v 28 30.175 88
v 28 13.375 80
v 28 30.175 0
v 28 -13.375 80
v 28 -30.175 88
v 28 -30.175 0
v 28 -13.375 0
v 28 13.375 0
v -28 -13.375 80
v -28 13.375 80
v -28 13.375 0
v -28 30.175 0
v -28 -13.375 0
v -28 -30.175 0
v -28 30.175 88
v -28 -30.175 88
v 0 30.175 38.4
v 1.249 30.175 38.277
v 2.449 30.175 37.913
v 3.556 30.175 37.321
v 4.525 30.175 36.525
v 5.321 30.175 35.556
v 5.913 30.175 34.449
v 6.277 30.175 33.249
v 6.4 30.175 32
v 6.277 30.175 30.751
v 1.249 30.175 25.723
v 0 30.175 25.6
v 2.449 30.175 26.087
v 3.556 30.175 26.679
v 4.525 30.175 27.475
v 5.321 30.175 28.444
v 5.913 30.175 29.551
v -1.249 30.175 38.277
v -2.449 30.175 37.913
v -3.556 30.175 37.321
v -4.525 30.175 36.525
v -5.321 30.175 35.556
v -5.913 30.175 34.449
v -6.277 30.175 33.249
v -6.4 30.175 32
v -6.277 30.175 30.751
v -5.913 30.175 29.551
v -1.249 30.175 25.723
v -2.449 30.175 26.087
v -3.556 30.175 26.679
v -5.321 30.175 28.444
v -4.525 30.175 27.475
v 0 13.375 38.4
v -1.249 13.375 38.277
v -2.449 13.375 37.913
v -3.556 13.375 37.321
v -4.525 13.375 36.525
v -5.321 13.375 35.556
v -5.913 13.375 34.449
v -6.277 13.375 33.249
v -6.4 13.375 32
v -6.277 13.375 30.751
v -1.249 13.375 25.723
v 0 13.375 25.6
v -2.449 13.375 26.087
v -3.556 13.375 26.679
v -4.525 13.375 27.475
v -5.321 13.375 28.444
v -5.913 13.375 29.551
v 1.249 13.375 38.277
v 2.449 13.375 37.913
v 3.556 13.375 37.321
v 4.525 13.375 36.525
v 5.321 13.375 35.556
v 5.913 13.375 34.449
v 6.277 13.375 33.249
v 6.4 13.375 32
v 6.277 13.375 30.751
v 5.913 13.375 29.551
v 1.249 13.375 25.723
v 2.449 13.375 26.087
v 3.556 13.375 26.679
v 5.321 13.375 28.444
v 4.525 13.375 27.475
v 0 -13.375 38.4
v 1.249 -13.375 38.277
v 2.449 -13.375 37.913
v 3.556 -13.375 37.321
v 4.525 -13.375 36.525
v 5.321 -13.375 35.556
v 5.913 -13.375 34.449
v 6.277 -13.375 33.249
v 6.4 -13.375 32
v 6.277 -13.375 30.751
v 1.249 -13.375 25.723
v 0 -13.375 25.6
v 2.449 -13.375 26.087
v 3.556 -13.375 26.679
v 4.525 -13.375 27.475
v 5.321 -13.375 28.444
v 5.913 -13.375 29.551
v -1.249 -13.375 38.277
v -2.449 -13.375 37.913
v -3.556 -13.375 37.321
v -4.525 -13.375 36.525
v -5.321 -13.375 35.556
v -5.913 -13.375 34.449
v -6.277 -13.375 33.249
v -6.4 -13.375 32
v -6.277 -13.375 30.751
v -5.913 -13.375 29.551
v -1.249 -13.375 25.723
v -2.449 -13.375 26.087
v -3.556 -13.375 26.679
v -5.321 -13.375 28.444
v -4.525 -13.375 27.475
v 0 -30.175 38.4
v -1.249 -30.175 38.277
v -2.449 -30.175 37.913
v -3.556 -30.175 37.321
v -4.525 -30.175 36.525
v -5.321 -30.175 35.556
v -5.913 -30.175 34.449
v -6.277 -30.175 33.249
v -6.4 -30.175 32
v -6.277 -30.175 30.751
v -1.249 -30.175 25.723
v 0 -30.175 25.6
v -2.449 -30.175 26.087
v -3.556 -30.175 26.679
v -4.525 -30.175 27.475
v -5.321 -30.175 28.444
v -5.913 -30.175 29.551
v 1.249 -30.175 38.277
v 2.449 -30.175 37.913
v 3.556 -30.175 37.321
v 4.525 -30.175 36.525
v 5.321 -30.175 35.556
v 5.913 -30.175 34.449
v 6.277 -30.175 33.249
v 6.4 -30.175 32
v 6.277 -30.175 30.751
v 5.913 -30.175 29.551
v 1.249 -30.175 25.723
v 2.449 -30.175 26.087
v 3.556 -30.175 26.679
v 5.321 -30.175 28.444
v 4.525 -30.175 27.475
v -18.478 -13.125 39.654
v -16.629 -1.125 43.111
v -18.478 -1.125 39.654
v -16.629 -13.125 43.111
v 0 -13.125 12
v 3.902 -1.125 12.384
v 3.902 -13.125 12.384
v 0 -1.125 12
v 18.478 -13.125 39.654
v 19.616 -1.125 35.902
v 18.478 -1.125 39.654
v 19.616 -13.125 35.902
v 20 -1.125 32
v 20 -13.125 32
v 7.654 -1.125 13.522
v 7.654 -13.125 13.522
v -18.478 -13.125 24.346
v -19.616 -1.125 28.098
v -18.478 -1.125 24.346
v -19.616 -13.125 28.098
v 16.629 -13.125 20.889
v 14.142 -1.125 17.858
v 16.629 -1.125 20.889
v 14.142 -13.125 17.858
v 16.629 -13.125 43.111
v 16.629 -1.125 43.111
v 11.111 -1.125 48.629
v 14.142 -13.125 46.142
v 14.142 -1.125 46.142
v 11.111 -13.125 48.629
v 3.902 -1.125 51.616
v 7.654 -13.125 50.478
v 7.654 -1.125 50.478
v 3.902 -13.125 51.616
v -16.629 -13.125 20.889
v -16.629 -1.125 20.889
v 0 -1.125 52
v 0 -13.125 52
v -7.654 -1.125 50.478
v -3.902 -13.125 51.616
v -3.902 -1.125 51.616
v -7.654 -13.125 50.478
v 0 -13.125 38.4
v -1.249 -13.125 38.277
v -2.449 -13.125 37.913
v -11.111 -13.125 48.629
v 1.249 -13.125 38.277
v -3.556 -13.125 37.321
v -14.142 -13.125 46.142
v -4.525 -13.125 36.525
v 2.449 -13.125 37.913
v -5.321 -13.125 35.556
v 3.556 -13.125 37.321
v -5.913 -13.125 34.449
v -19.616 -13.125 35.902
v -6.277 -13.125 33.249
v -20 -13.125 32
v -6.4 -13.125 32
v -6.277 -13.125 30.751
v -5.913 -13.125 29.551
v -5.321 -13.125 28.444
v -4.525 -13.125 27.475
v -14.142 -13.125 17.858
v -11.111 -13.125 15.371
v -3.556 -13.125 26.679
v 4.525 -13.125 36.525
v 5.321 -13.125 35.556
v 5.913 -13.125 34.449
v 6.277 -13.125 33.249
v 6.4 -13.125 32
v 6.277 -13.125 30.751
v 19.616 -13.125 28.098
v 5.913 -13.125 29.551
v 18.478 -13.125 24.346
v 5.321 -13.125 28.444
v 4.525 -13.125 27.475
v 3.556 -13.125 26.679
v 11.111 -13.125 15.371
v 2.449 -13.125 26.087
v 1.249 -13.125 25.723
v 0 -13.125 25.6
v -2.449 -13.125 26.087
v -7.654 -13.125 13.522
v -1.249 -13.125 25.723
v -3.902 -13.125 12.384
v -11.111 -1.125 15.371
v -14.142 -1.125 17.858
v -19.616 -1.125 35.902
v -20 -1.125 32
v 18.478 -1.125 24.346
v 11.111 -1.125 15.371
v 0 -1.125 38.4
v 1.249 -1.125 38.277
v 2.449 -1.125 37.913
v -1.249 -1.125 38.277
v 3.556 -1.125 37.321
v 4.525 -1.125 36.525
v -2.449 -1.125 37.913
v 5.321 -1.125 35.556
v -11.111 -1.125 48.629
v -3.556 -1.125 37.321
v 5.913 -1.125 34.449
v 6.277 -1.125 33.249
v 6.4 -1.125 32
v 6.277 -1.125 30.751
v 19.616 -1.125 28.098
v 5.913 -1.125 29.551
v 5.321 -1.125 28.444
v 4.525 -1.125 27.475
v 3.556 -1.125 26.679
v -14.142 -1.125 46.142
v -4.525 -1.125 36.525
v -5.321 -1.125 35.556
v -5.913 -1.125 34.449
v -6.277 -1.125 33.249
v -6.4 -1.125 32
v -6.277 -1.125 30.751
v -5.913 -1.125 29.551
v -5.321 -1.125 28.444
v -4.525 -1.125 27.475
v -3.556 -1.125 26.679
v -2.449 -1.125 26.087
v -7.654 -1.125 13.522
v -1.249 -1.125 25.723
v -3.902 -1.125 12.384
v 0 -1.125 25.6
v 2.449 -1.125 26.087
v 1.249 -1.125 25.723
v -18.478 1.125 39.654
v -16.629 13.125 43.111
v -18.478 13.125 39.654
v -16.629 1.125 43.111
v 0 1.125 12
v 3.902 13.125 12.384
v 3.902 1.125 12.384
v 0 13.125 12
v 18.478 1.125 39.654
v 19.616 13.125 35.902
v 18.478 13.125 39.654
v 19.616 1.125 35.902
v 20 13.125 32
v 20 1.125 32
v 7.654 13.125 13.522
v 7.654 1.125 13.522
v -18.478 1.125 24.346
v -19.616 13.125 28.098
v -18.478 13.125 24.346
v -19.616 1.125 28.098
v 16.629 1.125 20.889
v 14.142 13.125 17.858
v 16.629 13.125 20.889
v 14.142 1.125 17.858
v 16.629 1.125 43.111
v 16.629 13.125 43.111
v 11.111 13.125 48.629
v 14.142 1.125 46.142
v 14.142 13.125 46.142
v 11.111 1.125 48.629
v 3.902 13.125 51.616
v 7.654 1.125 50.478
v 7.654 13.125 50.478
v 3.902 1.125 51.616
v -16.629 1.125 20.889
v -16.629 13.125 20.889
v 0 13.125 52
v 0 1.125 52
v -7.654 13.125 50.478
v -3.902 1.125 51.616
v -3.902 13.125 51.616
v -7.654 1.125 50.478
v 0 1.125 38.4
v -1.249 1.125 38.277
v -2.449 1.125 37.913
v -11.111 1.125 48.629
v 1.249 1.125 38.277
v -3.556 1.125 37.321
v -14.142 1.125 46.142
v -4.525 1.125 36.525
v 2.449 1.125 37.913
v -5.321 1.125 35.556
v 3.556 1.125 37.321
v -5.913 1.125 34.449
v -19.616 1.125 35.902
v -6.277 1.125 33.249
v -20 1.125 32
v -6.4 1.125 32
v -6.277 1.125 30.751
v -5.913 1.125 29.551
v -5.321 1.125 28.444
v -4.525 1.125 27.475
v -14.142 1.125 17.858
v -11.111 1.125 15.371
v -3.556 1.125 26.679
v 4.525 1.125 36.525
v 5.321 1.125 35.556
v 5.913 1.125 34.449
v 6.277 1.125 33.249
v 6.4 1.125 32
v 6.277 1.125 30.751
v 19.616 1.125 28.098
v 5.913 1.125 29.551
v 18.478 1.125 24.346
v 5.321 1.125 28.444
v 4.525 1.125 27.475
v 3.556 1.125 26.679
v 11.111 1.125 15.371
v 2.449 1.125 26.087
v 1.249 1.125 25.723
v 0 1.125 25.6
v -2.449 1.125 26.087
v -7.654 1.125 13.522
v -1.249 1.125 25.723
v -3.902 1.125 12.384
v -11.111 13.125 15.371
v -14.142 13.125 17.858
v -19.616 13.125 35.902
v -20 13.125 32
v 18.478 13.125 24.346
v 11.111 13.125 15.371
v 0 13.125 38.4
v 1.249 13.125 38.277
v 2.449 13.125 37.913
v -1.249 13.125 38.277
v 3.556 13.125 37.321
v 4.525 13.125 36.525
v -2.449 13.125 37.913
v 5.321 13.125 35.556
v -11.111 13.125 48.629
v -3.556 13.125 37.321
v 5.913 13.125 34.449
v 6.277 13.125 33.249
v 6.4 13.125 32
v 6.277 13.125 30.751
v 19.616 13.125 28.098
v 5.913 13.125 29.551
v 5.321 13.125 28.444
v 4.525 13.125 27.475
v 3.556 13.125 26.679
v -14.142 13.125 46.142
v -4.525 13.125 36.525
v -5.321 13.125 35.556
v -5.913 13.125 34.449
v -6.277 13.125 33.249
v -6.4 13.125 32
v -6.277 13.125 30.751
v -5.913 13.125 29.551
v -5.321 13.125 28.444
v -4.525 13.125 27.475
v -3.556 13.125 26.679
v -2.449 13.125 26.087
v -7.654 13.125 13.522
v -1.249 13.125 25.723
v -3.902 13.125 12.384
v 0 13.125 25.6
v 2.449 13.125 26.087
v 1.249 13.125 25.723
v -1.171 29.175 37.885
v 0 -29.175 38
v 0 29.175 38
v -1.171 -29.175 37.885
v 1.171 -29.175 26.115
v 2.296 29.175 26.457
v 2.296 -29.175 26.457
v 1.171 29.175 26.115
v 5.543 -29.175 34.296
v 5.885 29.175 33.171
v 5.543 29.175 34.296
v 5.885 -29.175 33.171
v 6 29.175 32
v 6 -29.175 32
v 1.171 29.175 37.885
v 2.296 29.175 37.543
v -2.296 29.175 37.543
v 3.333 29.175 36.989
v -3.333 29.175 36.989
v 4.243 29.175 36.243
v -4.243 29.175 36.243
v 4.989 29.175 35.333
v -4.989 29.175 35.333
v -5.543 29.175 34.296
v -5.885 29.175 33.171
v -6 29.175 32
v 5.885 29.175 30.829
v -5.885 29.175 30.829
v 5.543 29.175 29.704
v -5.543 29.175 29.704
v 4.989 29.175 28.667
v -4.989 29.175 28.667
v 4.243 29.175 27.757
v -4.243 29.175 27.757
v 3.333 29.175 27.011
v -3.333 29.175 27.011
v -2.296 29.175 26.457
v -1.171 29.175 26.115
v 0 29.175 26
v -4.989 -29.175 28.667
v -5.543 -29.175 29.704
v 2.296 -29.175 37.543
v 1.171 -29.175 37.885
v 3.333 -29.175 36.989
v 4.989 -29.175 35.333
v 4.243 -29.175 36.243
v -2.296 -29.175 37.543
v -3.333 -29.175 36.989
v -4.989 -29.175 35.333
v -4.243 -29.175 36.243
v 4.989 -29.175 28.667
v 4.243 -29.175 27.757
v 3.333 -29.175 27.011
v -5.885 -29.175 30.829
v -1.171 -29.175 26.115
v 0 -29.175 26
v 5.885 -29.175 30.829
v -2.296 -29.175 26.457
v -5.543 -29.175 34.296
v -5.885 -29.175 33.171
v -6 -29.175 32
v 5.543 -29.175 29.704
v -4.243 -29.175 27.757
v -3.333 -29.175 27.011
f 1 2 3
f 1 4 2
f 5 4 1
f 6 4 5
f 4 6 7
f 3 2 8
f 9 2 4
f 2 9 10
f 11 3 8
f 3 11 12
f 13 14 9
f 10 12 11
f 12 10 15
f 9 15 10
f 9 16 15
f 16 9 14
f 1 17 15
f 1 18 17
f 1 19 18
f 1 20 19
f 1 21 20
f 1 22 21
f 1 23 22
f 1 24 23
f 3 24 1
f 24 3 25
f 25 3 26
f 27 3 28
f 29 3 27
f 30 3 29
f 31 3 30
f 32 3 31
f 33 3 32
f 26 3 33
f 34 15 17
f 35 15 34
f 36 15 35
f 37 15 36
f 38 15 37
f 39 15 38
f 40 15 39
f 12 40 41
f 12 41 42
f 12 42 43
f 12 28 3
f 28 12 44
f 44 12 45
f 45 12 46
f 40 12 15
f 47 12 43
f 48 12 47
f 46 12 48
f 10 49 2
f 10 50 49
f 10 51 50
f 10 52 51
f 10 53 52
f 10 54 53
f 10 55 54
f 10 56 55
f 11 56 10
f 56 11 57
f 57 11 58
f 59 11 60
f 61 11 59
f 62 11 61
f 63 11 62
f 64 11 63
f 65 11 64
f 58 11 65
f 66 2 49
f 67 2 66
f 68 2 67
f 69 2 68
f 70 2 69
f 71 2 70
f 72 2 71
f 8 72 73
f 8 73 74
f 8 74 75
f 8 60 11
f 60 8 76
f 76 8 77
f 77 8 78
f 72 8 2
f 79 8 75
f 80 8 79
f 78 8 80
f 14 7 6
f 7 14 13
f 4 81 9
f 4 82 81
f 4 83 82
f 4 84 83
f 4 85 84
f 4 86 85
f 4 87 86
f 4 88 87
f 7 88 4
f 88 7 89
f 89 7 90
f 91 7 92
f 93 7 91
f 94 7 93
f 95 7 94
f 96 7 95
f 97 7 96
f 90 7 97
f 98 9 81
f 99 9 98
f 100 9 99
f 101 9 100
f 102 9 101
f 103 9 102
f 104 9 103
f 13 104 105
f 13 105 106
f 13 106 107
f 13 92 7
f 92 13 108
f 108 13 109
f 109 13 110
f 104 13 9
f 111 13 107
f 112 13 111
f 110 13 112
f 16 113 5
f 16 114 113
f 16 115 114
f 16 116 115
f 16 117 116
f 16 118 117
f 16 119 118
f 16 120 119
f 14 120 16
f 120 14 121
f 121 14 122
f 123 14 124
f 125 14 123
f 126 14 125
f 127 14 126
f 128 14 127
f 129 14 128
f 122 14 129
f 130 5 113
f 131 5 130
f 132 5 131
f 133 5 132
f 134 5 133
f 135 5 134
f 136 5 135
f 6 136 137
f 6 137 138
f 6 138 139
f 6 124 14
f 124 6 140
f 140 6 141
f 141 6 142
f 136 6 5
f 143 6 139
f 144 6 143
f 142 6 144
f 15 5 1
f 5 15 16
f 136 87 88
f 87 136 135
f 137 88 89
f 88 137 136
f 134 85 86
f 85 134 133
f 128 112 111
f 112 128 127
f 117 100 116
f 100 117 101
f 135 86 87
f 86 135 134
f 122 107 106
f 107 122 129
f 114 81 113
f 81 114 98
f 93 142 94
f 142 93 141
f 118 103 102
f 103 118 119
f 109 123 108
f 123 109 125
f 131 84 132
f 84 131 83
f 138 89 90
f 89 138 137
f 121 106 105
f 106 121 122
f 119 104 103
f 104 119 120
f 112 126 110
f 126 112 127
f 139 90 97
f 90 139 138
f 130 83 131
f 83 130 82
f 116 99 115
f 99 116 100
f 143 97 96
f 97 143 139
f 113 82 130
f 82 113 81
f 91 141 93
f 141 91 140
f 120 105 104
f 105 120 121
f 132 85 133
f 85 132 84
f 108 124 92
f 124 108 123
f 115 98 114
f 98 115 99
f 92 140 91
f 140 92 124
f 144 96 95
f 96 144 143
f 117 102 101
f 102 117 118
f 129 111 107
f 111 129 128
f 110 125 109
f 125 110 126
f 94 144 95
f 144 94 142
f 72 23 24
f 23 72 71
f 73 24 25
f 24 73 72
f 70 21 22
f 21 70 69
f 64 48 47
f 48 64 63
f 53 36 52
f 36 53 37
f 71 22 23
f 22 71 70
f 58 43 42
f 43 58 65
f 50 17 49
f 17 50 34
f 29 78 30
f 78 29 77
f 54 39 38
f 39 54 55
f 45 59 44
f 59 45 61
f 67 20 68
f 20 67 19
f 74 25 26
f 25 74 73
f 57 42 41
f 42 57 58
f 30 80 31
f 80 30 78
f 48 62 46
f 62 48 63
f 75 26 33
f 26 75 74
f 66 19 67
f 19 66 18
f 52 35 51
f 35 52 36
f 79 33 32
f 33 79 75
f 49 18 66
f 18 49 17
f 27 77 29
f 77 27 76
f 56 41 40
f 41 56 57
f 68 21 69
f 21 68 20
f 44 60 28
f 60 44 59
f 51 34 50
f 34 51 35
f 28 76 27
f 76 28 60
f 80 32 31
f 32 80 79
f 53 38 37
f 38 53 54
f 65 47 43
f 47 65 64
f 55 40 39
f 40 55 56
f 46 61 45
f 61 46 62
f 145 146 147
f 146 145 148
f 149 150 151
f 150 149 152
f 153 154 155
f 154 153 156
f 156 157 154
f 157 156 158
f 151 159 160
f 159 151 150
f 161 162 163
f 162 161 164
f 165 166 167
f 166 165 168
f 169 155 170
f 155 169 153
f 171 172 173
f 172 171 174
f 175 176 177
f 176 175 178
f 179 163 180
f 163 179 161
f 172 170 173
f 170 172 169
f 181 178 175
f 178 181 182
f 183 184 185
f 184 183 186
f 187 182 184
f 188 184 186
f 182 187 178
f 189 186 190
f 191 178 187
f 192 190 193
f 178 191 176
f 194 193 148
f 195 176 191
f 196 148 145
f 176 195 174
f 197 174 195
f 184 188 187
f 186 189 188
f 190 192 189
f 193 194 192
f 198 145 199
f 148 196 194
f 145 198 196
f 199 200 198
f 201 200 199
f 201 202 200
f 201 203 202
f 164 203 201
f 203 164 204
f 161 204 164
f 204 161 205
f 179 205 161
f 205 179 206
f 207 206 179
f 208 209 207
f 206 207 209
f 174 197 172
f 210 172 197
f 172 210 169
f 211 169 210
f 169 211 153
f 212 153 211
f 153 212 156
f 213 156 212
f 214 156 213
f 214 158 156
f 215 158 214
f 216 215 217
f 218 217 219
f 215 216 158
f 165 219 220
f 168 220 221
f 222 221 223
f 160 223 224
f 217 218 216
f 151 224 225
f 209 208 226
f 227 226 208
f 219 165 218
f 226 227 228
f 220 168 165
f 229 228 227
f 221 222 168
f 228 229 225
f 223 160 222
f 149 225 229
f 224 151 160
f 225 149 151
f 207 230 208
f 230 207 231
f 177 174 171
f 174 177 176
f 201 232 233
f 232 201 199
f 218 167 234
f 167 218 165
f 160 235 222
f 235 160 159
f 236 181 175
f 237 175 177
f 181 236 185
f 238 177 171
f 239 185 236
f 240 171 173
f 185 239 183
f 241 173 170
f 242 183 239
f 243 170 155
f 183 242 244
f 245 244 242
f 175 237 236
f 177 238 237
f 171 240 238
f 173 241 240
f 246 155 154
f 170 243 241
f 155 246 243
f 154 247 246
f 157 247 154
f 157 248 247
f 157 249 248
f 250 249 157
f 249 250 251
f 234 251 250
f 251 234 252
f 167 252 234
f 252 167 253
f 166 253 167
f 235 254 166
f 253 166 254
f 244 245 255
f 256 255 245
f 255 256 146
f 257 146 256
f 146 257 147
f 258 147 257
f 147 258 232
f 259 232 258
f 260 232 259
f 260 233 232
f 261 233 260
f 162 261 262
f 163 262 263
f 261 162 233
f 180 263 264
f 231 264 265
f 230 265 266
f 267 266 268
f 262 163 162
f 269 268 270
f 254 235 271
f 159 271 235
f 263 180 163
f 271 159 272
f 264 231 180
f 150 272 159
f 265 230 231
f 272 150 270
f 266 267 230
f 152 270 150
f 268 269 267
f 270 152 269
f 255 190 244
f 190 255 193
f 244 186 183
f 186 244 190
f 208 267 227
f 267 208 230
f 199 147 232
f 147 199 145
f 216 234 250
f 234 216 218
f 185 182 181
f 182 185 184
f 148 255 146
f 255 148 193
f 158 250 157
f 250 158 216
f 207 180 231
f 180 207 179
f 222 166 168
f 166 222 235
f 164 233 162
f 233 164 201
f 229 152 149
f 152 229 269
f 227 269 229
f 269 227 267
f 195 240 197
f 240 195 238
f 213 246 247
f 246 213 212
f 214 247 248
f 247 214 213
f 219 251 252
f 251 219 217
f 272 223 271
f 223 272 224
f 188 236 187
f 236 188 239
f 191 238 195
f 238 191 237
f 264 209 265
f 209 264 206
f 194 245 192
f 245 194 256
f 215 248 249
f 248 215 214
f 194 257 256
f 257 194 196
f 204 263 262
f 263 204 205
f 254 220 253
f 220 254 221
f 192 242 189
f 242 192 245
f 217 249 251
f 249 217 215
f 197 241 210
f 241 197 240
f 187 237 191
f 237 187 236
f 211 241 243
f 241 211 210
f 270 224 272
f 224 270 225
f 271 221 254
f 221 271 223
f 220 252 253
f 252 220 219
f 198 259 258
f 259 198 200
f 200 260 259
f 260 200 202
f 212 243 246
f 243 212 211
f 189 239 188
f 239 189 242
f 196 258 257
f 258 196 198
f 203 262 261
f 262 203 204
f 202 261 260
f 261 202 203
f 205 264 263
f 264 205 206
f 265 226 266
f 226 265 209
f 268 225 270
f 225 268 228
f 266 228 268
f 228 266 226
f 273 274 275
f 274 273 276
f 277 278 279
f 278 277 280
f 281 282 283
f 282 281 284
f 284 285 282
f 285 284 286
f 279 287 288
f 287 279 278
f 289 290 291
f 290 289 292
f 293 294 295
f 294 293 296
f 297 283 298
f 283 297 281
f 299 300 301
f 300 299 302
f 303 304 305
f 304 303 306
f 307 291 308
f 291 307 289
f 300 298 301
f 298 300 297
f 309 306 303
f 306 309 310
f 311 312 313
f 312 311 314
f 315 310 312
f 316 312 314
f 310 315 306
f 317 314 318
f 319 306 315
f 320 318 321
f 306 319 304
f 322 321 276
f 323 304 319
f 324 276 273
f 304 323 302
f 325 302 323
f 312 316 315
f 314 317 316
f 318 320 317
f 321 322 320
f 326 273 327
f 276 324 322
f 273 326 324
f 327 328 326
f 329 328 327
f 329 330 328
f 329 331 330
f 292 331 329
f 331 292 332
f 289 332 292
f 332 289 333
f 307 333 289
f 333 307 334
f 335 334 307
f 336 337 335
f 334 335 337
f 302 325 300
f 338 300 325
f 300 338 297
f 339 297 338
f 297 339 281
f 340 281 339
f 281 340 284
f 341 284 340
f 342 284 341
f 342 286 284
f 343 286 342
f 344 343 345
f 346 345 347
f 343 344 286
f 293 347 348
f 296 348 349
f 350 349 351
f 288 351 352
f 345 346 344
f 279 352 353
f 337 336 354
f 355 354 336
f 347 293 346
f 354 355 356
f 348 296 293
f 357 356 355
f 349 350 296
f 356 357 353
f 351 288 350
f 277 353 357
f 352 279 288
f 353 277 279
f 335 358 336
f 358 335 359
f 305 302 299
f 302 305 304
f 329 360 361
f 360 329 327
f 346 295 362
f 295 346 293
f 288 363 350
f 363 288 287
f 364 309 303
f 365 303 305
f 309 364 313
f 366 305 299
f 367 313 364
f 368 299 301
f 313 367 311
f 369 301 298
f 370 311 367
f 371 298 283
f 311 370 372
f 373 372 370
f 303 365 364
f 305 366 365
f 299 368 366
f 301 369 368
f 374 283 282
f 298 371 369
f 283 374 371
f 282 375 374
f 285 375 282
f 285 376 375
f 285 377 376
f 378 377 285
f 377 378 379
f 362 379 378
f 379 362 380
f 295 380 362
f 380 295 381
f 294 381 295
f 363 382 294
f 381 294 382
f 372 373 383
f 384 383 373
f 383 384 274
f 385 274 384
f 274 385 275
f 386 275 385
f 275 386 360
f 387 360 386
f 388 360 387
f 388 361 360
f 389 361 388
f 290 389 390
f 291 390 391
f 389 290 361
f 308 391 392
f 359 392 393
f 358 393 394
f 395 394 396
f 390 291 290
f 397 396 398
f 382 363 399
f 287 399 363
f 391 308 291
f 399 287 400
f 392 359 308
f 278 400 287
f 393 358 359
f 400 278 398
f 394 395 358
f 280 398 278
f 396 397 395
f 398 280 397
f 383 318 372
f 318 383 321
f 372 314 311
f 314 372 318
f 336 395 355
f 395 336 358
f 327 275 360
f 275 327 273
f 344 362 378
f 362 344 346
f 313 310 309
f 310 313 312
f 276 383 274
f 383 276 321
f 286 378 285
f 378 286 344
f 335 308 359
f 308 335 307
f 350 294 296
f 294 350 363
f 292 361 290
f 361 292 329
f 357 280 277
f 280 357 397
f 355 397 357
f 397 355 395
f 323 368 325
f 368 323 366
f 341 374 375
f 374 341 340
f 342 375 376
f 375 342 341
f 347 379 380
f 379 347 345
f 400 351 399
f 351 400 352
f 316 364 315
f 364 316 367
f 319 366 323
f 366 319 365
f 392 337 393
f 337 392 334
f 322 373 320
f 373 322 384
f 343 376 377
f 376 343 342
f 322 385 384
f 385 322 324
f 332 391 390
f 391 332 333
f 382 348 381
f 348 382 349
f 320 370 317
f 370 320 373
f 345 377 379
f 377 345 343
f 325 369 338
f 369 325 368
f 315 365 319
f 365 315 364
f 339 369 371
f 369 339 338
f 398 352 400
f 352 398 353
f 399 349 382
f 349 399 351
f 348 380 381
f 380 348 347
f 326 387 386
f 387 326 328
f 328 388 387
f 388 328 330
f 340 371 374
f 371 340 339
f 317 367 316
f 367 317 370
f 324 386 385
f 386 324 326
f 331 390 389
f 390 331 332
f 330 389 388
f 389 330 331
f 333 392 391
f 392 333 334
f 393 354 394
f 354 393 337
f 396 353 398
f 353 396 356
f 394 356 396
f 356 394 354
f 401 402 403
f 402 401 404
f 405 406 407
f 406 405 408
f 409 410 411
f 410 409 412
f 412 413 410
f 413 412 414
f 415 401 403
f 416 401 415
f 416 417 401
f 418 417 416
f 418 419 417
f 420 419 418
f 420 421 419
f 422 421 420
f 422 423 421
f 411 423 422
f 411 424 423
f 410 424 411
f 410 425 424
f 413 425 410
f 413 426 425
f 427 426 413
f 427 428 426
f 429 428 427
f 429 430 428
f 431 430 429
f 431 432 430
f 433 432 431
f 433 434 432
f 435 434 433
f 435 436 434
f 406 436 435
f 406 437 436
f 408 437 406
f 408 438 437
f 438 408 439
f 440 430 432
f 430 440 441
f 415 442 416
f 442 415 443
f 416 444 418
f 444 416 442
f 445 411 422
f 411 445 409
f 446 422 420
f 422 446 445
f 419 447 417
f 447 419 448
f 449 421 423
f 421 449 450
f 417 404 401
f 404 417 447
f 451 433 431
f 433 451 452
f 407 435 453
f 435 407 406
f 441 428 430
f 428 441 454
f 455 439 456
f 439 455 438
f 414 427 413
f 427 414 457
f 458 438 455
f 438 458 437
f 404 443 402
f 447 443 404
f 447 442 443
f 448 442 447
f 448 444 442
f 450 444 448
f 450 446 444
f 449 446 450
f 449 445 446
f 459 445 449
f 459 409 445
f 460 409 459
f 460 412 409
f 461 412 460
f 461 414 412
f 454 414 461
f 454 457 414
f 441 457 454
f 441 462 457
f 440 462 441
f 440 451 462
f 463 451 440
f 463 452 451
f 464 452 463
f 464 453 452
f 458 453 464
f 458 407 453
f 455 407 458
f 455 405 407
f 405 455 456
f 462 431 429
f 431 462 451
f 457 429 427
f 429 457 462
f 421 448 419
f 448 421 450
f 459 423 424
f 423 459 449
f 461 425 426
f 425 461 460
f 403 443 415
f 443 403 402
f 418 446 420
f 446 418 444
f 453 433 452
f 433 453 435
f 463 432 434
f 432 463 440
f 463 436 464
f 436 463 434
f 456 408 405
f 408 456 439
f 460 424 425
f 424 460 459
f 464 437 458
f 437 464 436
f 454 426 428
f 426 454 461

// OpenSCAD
$fn = 32;

// ------------------------------------------------------------------------
// Trolley wheel set: wheels d40, fork 80 mm tall
// Every part is its own module, assembly() places every instance.
// ------------------------------------------------------------------------

// --- part 1 ---
module trolley_fork() {
  difference() {
    union() {
      translate([-28, 13.375, 0]) cube([56, 16.8, 80]);
      translate([-28, -30.175, 0]) cube([56, 16.8, 80]);
      translate([-28, -30.175, 80]) cube([56, 60.35, 8]);
    }
    translate([0, -21.775, 32]) rotate([90, 0, 0]) cylinder(h = 18.8, d = 12.8, center = true);
    translate([0, 21.775, 32]) rotate([90, 0, 0]) cylinder(h = 18.8, d = 12.8, center = true);
  }
}

// --- part 2 ---
module trolley_wheel() {
  difference() {
      translate([0, 0, 0]) cylinder(h = 12, d = 40);
      translate([0, 0, -1]) cylinder(h = 14, d = 12.8);
    }
}

// --- part 3 ---
module trolley_axle() {
  translate([0, 0, -29.175]) cylinder(h = 58.35, d = 12);
}

// --- assembly ---
module assembly() {
  color([0.80, 0.24, 0.20]) translate([0, 0, 0]) rotate([0, 0, 0]) trolley_fork();
  color([0.20, 0.45, 0.75]) translate([0, -1.125, 32]) rotate([90, 0, 0]) trolley_wheel();
  color([0.25, 0.62, 0.32]) translate([0, 13.125, 32]) rotate([90, 0, 0]) trolley_wheel();
  color([0.92, 0.70, 0.18]) translate([0, 0, 32]) rotate([90, 0, 0]) trolley_axle();
}

assembly();
